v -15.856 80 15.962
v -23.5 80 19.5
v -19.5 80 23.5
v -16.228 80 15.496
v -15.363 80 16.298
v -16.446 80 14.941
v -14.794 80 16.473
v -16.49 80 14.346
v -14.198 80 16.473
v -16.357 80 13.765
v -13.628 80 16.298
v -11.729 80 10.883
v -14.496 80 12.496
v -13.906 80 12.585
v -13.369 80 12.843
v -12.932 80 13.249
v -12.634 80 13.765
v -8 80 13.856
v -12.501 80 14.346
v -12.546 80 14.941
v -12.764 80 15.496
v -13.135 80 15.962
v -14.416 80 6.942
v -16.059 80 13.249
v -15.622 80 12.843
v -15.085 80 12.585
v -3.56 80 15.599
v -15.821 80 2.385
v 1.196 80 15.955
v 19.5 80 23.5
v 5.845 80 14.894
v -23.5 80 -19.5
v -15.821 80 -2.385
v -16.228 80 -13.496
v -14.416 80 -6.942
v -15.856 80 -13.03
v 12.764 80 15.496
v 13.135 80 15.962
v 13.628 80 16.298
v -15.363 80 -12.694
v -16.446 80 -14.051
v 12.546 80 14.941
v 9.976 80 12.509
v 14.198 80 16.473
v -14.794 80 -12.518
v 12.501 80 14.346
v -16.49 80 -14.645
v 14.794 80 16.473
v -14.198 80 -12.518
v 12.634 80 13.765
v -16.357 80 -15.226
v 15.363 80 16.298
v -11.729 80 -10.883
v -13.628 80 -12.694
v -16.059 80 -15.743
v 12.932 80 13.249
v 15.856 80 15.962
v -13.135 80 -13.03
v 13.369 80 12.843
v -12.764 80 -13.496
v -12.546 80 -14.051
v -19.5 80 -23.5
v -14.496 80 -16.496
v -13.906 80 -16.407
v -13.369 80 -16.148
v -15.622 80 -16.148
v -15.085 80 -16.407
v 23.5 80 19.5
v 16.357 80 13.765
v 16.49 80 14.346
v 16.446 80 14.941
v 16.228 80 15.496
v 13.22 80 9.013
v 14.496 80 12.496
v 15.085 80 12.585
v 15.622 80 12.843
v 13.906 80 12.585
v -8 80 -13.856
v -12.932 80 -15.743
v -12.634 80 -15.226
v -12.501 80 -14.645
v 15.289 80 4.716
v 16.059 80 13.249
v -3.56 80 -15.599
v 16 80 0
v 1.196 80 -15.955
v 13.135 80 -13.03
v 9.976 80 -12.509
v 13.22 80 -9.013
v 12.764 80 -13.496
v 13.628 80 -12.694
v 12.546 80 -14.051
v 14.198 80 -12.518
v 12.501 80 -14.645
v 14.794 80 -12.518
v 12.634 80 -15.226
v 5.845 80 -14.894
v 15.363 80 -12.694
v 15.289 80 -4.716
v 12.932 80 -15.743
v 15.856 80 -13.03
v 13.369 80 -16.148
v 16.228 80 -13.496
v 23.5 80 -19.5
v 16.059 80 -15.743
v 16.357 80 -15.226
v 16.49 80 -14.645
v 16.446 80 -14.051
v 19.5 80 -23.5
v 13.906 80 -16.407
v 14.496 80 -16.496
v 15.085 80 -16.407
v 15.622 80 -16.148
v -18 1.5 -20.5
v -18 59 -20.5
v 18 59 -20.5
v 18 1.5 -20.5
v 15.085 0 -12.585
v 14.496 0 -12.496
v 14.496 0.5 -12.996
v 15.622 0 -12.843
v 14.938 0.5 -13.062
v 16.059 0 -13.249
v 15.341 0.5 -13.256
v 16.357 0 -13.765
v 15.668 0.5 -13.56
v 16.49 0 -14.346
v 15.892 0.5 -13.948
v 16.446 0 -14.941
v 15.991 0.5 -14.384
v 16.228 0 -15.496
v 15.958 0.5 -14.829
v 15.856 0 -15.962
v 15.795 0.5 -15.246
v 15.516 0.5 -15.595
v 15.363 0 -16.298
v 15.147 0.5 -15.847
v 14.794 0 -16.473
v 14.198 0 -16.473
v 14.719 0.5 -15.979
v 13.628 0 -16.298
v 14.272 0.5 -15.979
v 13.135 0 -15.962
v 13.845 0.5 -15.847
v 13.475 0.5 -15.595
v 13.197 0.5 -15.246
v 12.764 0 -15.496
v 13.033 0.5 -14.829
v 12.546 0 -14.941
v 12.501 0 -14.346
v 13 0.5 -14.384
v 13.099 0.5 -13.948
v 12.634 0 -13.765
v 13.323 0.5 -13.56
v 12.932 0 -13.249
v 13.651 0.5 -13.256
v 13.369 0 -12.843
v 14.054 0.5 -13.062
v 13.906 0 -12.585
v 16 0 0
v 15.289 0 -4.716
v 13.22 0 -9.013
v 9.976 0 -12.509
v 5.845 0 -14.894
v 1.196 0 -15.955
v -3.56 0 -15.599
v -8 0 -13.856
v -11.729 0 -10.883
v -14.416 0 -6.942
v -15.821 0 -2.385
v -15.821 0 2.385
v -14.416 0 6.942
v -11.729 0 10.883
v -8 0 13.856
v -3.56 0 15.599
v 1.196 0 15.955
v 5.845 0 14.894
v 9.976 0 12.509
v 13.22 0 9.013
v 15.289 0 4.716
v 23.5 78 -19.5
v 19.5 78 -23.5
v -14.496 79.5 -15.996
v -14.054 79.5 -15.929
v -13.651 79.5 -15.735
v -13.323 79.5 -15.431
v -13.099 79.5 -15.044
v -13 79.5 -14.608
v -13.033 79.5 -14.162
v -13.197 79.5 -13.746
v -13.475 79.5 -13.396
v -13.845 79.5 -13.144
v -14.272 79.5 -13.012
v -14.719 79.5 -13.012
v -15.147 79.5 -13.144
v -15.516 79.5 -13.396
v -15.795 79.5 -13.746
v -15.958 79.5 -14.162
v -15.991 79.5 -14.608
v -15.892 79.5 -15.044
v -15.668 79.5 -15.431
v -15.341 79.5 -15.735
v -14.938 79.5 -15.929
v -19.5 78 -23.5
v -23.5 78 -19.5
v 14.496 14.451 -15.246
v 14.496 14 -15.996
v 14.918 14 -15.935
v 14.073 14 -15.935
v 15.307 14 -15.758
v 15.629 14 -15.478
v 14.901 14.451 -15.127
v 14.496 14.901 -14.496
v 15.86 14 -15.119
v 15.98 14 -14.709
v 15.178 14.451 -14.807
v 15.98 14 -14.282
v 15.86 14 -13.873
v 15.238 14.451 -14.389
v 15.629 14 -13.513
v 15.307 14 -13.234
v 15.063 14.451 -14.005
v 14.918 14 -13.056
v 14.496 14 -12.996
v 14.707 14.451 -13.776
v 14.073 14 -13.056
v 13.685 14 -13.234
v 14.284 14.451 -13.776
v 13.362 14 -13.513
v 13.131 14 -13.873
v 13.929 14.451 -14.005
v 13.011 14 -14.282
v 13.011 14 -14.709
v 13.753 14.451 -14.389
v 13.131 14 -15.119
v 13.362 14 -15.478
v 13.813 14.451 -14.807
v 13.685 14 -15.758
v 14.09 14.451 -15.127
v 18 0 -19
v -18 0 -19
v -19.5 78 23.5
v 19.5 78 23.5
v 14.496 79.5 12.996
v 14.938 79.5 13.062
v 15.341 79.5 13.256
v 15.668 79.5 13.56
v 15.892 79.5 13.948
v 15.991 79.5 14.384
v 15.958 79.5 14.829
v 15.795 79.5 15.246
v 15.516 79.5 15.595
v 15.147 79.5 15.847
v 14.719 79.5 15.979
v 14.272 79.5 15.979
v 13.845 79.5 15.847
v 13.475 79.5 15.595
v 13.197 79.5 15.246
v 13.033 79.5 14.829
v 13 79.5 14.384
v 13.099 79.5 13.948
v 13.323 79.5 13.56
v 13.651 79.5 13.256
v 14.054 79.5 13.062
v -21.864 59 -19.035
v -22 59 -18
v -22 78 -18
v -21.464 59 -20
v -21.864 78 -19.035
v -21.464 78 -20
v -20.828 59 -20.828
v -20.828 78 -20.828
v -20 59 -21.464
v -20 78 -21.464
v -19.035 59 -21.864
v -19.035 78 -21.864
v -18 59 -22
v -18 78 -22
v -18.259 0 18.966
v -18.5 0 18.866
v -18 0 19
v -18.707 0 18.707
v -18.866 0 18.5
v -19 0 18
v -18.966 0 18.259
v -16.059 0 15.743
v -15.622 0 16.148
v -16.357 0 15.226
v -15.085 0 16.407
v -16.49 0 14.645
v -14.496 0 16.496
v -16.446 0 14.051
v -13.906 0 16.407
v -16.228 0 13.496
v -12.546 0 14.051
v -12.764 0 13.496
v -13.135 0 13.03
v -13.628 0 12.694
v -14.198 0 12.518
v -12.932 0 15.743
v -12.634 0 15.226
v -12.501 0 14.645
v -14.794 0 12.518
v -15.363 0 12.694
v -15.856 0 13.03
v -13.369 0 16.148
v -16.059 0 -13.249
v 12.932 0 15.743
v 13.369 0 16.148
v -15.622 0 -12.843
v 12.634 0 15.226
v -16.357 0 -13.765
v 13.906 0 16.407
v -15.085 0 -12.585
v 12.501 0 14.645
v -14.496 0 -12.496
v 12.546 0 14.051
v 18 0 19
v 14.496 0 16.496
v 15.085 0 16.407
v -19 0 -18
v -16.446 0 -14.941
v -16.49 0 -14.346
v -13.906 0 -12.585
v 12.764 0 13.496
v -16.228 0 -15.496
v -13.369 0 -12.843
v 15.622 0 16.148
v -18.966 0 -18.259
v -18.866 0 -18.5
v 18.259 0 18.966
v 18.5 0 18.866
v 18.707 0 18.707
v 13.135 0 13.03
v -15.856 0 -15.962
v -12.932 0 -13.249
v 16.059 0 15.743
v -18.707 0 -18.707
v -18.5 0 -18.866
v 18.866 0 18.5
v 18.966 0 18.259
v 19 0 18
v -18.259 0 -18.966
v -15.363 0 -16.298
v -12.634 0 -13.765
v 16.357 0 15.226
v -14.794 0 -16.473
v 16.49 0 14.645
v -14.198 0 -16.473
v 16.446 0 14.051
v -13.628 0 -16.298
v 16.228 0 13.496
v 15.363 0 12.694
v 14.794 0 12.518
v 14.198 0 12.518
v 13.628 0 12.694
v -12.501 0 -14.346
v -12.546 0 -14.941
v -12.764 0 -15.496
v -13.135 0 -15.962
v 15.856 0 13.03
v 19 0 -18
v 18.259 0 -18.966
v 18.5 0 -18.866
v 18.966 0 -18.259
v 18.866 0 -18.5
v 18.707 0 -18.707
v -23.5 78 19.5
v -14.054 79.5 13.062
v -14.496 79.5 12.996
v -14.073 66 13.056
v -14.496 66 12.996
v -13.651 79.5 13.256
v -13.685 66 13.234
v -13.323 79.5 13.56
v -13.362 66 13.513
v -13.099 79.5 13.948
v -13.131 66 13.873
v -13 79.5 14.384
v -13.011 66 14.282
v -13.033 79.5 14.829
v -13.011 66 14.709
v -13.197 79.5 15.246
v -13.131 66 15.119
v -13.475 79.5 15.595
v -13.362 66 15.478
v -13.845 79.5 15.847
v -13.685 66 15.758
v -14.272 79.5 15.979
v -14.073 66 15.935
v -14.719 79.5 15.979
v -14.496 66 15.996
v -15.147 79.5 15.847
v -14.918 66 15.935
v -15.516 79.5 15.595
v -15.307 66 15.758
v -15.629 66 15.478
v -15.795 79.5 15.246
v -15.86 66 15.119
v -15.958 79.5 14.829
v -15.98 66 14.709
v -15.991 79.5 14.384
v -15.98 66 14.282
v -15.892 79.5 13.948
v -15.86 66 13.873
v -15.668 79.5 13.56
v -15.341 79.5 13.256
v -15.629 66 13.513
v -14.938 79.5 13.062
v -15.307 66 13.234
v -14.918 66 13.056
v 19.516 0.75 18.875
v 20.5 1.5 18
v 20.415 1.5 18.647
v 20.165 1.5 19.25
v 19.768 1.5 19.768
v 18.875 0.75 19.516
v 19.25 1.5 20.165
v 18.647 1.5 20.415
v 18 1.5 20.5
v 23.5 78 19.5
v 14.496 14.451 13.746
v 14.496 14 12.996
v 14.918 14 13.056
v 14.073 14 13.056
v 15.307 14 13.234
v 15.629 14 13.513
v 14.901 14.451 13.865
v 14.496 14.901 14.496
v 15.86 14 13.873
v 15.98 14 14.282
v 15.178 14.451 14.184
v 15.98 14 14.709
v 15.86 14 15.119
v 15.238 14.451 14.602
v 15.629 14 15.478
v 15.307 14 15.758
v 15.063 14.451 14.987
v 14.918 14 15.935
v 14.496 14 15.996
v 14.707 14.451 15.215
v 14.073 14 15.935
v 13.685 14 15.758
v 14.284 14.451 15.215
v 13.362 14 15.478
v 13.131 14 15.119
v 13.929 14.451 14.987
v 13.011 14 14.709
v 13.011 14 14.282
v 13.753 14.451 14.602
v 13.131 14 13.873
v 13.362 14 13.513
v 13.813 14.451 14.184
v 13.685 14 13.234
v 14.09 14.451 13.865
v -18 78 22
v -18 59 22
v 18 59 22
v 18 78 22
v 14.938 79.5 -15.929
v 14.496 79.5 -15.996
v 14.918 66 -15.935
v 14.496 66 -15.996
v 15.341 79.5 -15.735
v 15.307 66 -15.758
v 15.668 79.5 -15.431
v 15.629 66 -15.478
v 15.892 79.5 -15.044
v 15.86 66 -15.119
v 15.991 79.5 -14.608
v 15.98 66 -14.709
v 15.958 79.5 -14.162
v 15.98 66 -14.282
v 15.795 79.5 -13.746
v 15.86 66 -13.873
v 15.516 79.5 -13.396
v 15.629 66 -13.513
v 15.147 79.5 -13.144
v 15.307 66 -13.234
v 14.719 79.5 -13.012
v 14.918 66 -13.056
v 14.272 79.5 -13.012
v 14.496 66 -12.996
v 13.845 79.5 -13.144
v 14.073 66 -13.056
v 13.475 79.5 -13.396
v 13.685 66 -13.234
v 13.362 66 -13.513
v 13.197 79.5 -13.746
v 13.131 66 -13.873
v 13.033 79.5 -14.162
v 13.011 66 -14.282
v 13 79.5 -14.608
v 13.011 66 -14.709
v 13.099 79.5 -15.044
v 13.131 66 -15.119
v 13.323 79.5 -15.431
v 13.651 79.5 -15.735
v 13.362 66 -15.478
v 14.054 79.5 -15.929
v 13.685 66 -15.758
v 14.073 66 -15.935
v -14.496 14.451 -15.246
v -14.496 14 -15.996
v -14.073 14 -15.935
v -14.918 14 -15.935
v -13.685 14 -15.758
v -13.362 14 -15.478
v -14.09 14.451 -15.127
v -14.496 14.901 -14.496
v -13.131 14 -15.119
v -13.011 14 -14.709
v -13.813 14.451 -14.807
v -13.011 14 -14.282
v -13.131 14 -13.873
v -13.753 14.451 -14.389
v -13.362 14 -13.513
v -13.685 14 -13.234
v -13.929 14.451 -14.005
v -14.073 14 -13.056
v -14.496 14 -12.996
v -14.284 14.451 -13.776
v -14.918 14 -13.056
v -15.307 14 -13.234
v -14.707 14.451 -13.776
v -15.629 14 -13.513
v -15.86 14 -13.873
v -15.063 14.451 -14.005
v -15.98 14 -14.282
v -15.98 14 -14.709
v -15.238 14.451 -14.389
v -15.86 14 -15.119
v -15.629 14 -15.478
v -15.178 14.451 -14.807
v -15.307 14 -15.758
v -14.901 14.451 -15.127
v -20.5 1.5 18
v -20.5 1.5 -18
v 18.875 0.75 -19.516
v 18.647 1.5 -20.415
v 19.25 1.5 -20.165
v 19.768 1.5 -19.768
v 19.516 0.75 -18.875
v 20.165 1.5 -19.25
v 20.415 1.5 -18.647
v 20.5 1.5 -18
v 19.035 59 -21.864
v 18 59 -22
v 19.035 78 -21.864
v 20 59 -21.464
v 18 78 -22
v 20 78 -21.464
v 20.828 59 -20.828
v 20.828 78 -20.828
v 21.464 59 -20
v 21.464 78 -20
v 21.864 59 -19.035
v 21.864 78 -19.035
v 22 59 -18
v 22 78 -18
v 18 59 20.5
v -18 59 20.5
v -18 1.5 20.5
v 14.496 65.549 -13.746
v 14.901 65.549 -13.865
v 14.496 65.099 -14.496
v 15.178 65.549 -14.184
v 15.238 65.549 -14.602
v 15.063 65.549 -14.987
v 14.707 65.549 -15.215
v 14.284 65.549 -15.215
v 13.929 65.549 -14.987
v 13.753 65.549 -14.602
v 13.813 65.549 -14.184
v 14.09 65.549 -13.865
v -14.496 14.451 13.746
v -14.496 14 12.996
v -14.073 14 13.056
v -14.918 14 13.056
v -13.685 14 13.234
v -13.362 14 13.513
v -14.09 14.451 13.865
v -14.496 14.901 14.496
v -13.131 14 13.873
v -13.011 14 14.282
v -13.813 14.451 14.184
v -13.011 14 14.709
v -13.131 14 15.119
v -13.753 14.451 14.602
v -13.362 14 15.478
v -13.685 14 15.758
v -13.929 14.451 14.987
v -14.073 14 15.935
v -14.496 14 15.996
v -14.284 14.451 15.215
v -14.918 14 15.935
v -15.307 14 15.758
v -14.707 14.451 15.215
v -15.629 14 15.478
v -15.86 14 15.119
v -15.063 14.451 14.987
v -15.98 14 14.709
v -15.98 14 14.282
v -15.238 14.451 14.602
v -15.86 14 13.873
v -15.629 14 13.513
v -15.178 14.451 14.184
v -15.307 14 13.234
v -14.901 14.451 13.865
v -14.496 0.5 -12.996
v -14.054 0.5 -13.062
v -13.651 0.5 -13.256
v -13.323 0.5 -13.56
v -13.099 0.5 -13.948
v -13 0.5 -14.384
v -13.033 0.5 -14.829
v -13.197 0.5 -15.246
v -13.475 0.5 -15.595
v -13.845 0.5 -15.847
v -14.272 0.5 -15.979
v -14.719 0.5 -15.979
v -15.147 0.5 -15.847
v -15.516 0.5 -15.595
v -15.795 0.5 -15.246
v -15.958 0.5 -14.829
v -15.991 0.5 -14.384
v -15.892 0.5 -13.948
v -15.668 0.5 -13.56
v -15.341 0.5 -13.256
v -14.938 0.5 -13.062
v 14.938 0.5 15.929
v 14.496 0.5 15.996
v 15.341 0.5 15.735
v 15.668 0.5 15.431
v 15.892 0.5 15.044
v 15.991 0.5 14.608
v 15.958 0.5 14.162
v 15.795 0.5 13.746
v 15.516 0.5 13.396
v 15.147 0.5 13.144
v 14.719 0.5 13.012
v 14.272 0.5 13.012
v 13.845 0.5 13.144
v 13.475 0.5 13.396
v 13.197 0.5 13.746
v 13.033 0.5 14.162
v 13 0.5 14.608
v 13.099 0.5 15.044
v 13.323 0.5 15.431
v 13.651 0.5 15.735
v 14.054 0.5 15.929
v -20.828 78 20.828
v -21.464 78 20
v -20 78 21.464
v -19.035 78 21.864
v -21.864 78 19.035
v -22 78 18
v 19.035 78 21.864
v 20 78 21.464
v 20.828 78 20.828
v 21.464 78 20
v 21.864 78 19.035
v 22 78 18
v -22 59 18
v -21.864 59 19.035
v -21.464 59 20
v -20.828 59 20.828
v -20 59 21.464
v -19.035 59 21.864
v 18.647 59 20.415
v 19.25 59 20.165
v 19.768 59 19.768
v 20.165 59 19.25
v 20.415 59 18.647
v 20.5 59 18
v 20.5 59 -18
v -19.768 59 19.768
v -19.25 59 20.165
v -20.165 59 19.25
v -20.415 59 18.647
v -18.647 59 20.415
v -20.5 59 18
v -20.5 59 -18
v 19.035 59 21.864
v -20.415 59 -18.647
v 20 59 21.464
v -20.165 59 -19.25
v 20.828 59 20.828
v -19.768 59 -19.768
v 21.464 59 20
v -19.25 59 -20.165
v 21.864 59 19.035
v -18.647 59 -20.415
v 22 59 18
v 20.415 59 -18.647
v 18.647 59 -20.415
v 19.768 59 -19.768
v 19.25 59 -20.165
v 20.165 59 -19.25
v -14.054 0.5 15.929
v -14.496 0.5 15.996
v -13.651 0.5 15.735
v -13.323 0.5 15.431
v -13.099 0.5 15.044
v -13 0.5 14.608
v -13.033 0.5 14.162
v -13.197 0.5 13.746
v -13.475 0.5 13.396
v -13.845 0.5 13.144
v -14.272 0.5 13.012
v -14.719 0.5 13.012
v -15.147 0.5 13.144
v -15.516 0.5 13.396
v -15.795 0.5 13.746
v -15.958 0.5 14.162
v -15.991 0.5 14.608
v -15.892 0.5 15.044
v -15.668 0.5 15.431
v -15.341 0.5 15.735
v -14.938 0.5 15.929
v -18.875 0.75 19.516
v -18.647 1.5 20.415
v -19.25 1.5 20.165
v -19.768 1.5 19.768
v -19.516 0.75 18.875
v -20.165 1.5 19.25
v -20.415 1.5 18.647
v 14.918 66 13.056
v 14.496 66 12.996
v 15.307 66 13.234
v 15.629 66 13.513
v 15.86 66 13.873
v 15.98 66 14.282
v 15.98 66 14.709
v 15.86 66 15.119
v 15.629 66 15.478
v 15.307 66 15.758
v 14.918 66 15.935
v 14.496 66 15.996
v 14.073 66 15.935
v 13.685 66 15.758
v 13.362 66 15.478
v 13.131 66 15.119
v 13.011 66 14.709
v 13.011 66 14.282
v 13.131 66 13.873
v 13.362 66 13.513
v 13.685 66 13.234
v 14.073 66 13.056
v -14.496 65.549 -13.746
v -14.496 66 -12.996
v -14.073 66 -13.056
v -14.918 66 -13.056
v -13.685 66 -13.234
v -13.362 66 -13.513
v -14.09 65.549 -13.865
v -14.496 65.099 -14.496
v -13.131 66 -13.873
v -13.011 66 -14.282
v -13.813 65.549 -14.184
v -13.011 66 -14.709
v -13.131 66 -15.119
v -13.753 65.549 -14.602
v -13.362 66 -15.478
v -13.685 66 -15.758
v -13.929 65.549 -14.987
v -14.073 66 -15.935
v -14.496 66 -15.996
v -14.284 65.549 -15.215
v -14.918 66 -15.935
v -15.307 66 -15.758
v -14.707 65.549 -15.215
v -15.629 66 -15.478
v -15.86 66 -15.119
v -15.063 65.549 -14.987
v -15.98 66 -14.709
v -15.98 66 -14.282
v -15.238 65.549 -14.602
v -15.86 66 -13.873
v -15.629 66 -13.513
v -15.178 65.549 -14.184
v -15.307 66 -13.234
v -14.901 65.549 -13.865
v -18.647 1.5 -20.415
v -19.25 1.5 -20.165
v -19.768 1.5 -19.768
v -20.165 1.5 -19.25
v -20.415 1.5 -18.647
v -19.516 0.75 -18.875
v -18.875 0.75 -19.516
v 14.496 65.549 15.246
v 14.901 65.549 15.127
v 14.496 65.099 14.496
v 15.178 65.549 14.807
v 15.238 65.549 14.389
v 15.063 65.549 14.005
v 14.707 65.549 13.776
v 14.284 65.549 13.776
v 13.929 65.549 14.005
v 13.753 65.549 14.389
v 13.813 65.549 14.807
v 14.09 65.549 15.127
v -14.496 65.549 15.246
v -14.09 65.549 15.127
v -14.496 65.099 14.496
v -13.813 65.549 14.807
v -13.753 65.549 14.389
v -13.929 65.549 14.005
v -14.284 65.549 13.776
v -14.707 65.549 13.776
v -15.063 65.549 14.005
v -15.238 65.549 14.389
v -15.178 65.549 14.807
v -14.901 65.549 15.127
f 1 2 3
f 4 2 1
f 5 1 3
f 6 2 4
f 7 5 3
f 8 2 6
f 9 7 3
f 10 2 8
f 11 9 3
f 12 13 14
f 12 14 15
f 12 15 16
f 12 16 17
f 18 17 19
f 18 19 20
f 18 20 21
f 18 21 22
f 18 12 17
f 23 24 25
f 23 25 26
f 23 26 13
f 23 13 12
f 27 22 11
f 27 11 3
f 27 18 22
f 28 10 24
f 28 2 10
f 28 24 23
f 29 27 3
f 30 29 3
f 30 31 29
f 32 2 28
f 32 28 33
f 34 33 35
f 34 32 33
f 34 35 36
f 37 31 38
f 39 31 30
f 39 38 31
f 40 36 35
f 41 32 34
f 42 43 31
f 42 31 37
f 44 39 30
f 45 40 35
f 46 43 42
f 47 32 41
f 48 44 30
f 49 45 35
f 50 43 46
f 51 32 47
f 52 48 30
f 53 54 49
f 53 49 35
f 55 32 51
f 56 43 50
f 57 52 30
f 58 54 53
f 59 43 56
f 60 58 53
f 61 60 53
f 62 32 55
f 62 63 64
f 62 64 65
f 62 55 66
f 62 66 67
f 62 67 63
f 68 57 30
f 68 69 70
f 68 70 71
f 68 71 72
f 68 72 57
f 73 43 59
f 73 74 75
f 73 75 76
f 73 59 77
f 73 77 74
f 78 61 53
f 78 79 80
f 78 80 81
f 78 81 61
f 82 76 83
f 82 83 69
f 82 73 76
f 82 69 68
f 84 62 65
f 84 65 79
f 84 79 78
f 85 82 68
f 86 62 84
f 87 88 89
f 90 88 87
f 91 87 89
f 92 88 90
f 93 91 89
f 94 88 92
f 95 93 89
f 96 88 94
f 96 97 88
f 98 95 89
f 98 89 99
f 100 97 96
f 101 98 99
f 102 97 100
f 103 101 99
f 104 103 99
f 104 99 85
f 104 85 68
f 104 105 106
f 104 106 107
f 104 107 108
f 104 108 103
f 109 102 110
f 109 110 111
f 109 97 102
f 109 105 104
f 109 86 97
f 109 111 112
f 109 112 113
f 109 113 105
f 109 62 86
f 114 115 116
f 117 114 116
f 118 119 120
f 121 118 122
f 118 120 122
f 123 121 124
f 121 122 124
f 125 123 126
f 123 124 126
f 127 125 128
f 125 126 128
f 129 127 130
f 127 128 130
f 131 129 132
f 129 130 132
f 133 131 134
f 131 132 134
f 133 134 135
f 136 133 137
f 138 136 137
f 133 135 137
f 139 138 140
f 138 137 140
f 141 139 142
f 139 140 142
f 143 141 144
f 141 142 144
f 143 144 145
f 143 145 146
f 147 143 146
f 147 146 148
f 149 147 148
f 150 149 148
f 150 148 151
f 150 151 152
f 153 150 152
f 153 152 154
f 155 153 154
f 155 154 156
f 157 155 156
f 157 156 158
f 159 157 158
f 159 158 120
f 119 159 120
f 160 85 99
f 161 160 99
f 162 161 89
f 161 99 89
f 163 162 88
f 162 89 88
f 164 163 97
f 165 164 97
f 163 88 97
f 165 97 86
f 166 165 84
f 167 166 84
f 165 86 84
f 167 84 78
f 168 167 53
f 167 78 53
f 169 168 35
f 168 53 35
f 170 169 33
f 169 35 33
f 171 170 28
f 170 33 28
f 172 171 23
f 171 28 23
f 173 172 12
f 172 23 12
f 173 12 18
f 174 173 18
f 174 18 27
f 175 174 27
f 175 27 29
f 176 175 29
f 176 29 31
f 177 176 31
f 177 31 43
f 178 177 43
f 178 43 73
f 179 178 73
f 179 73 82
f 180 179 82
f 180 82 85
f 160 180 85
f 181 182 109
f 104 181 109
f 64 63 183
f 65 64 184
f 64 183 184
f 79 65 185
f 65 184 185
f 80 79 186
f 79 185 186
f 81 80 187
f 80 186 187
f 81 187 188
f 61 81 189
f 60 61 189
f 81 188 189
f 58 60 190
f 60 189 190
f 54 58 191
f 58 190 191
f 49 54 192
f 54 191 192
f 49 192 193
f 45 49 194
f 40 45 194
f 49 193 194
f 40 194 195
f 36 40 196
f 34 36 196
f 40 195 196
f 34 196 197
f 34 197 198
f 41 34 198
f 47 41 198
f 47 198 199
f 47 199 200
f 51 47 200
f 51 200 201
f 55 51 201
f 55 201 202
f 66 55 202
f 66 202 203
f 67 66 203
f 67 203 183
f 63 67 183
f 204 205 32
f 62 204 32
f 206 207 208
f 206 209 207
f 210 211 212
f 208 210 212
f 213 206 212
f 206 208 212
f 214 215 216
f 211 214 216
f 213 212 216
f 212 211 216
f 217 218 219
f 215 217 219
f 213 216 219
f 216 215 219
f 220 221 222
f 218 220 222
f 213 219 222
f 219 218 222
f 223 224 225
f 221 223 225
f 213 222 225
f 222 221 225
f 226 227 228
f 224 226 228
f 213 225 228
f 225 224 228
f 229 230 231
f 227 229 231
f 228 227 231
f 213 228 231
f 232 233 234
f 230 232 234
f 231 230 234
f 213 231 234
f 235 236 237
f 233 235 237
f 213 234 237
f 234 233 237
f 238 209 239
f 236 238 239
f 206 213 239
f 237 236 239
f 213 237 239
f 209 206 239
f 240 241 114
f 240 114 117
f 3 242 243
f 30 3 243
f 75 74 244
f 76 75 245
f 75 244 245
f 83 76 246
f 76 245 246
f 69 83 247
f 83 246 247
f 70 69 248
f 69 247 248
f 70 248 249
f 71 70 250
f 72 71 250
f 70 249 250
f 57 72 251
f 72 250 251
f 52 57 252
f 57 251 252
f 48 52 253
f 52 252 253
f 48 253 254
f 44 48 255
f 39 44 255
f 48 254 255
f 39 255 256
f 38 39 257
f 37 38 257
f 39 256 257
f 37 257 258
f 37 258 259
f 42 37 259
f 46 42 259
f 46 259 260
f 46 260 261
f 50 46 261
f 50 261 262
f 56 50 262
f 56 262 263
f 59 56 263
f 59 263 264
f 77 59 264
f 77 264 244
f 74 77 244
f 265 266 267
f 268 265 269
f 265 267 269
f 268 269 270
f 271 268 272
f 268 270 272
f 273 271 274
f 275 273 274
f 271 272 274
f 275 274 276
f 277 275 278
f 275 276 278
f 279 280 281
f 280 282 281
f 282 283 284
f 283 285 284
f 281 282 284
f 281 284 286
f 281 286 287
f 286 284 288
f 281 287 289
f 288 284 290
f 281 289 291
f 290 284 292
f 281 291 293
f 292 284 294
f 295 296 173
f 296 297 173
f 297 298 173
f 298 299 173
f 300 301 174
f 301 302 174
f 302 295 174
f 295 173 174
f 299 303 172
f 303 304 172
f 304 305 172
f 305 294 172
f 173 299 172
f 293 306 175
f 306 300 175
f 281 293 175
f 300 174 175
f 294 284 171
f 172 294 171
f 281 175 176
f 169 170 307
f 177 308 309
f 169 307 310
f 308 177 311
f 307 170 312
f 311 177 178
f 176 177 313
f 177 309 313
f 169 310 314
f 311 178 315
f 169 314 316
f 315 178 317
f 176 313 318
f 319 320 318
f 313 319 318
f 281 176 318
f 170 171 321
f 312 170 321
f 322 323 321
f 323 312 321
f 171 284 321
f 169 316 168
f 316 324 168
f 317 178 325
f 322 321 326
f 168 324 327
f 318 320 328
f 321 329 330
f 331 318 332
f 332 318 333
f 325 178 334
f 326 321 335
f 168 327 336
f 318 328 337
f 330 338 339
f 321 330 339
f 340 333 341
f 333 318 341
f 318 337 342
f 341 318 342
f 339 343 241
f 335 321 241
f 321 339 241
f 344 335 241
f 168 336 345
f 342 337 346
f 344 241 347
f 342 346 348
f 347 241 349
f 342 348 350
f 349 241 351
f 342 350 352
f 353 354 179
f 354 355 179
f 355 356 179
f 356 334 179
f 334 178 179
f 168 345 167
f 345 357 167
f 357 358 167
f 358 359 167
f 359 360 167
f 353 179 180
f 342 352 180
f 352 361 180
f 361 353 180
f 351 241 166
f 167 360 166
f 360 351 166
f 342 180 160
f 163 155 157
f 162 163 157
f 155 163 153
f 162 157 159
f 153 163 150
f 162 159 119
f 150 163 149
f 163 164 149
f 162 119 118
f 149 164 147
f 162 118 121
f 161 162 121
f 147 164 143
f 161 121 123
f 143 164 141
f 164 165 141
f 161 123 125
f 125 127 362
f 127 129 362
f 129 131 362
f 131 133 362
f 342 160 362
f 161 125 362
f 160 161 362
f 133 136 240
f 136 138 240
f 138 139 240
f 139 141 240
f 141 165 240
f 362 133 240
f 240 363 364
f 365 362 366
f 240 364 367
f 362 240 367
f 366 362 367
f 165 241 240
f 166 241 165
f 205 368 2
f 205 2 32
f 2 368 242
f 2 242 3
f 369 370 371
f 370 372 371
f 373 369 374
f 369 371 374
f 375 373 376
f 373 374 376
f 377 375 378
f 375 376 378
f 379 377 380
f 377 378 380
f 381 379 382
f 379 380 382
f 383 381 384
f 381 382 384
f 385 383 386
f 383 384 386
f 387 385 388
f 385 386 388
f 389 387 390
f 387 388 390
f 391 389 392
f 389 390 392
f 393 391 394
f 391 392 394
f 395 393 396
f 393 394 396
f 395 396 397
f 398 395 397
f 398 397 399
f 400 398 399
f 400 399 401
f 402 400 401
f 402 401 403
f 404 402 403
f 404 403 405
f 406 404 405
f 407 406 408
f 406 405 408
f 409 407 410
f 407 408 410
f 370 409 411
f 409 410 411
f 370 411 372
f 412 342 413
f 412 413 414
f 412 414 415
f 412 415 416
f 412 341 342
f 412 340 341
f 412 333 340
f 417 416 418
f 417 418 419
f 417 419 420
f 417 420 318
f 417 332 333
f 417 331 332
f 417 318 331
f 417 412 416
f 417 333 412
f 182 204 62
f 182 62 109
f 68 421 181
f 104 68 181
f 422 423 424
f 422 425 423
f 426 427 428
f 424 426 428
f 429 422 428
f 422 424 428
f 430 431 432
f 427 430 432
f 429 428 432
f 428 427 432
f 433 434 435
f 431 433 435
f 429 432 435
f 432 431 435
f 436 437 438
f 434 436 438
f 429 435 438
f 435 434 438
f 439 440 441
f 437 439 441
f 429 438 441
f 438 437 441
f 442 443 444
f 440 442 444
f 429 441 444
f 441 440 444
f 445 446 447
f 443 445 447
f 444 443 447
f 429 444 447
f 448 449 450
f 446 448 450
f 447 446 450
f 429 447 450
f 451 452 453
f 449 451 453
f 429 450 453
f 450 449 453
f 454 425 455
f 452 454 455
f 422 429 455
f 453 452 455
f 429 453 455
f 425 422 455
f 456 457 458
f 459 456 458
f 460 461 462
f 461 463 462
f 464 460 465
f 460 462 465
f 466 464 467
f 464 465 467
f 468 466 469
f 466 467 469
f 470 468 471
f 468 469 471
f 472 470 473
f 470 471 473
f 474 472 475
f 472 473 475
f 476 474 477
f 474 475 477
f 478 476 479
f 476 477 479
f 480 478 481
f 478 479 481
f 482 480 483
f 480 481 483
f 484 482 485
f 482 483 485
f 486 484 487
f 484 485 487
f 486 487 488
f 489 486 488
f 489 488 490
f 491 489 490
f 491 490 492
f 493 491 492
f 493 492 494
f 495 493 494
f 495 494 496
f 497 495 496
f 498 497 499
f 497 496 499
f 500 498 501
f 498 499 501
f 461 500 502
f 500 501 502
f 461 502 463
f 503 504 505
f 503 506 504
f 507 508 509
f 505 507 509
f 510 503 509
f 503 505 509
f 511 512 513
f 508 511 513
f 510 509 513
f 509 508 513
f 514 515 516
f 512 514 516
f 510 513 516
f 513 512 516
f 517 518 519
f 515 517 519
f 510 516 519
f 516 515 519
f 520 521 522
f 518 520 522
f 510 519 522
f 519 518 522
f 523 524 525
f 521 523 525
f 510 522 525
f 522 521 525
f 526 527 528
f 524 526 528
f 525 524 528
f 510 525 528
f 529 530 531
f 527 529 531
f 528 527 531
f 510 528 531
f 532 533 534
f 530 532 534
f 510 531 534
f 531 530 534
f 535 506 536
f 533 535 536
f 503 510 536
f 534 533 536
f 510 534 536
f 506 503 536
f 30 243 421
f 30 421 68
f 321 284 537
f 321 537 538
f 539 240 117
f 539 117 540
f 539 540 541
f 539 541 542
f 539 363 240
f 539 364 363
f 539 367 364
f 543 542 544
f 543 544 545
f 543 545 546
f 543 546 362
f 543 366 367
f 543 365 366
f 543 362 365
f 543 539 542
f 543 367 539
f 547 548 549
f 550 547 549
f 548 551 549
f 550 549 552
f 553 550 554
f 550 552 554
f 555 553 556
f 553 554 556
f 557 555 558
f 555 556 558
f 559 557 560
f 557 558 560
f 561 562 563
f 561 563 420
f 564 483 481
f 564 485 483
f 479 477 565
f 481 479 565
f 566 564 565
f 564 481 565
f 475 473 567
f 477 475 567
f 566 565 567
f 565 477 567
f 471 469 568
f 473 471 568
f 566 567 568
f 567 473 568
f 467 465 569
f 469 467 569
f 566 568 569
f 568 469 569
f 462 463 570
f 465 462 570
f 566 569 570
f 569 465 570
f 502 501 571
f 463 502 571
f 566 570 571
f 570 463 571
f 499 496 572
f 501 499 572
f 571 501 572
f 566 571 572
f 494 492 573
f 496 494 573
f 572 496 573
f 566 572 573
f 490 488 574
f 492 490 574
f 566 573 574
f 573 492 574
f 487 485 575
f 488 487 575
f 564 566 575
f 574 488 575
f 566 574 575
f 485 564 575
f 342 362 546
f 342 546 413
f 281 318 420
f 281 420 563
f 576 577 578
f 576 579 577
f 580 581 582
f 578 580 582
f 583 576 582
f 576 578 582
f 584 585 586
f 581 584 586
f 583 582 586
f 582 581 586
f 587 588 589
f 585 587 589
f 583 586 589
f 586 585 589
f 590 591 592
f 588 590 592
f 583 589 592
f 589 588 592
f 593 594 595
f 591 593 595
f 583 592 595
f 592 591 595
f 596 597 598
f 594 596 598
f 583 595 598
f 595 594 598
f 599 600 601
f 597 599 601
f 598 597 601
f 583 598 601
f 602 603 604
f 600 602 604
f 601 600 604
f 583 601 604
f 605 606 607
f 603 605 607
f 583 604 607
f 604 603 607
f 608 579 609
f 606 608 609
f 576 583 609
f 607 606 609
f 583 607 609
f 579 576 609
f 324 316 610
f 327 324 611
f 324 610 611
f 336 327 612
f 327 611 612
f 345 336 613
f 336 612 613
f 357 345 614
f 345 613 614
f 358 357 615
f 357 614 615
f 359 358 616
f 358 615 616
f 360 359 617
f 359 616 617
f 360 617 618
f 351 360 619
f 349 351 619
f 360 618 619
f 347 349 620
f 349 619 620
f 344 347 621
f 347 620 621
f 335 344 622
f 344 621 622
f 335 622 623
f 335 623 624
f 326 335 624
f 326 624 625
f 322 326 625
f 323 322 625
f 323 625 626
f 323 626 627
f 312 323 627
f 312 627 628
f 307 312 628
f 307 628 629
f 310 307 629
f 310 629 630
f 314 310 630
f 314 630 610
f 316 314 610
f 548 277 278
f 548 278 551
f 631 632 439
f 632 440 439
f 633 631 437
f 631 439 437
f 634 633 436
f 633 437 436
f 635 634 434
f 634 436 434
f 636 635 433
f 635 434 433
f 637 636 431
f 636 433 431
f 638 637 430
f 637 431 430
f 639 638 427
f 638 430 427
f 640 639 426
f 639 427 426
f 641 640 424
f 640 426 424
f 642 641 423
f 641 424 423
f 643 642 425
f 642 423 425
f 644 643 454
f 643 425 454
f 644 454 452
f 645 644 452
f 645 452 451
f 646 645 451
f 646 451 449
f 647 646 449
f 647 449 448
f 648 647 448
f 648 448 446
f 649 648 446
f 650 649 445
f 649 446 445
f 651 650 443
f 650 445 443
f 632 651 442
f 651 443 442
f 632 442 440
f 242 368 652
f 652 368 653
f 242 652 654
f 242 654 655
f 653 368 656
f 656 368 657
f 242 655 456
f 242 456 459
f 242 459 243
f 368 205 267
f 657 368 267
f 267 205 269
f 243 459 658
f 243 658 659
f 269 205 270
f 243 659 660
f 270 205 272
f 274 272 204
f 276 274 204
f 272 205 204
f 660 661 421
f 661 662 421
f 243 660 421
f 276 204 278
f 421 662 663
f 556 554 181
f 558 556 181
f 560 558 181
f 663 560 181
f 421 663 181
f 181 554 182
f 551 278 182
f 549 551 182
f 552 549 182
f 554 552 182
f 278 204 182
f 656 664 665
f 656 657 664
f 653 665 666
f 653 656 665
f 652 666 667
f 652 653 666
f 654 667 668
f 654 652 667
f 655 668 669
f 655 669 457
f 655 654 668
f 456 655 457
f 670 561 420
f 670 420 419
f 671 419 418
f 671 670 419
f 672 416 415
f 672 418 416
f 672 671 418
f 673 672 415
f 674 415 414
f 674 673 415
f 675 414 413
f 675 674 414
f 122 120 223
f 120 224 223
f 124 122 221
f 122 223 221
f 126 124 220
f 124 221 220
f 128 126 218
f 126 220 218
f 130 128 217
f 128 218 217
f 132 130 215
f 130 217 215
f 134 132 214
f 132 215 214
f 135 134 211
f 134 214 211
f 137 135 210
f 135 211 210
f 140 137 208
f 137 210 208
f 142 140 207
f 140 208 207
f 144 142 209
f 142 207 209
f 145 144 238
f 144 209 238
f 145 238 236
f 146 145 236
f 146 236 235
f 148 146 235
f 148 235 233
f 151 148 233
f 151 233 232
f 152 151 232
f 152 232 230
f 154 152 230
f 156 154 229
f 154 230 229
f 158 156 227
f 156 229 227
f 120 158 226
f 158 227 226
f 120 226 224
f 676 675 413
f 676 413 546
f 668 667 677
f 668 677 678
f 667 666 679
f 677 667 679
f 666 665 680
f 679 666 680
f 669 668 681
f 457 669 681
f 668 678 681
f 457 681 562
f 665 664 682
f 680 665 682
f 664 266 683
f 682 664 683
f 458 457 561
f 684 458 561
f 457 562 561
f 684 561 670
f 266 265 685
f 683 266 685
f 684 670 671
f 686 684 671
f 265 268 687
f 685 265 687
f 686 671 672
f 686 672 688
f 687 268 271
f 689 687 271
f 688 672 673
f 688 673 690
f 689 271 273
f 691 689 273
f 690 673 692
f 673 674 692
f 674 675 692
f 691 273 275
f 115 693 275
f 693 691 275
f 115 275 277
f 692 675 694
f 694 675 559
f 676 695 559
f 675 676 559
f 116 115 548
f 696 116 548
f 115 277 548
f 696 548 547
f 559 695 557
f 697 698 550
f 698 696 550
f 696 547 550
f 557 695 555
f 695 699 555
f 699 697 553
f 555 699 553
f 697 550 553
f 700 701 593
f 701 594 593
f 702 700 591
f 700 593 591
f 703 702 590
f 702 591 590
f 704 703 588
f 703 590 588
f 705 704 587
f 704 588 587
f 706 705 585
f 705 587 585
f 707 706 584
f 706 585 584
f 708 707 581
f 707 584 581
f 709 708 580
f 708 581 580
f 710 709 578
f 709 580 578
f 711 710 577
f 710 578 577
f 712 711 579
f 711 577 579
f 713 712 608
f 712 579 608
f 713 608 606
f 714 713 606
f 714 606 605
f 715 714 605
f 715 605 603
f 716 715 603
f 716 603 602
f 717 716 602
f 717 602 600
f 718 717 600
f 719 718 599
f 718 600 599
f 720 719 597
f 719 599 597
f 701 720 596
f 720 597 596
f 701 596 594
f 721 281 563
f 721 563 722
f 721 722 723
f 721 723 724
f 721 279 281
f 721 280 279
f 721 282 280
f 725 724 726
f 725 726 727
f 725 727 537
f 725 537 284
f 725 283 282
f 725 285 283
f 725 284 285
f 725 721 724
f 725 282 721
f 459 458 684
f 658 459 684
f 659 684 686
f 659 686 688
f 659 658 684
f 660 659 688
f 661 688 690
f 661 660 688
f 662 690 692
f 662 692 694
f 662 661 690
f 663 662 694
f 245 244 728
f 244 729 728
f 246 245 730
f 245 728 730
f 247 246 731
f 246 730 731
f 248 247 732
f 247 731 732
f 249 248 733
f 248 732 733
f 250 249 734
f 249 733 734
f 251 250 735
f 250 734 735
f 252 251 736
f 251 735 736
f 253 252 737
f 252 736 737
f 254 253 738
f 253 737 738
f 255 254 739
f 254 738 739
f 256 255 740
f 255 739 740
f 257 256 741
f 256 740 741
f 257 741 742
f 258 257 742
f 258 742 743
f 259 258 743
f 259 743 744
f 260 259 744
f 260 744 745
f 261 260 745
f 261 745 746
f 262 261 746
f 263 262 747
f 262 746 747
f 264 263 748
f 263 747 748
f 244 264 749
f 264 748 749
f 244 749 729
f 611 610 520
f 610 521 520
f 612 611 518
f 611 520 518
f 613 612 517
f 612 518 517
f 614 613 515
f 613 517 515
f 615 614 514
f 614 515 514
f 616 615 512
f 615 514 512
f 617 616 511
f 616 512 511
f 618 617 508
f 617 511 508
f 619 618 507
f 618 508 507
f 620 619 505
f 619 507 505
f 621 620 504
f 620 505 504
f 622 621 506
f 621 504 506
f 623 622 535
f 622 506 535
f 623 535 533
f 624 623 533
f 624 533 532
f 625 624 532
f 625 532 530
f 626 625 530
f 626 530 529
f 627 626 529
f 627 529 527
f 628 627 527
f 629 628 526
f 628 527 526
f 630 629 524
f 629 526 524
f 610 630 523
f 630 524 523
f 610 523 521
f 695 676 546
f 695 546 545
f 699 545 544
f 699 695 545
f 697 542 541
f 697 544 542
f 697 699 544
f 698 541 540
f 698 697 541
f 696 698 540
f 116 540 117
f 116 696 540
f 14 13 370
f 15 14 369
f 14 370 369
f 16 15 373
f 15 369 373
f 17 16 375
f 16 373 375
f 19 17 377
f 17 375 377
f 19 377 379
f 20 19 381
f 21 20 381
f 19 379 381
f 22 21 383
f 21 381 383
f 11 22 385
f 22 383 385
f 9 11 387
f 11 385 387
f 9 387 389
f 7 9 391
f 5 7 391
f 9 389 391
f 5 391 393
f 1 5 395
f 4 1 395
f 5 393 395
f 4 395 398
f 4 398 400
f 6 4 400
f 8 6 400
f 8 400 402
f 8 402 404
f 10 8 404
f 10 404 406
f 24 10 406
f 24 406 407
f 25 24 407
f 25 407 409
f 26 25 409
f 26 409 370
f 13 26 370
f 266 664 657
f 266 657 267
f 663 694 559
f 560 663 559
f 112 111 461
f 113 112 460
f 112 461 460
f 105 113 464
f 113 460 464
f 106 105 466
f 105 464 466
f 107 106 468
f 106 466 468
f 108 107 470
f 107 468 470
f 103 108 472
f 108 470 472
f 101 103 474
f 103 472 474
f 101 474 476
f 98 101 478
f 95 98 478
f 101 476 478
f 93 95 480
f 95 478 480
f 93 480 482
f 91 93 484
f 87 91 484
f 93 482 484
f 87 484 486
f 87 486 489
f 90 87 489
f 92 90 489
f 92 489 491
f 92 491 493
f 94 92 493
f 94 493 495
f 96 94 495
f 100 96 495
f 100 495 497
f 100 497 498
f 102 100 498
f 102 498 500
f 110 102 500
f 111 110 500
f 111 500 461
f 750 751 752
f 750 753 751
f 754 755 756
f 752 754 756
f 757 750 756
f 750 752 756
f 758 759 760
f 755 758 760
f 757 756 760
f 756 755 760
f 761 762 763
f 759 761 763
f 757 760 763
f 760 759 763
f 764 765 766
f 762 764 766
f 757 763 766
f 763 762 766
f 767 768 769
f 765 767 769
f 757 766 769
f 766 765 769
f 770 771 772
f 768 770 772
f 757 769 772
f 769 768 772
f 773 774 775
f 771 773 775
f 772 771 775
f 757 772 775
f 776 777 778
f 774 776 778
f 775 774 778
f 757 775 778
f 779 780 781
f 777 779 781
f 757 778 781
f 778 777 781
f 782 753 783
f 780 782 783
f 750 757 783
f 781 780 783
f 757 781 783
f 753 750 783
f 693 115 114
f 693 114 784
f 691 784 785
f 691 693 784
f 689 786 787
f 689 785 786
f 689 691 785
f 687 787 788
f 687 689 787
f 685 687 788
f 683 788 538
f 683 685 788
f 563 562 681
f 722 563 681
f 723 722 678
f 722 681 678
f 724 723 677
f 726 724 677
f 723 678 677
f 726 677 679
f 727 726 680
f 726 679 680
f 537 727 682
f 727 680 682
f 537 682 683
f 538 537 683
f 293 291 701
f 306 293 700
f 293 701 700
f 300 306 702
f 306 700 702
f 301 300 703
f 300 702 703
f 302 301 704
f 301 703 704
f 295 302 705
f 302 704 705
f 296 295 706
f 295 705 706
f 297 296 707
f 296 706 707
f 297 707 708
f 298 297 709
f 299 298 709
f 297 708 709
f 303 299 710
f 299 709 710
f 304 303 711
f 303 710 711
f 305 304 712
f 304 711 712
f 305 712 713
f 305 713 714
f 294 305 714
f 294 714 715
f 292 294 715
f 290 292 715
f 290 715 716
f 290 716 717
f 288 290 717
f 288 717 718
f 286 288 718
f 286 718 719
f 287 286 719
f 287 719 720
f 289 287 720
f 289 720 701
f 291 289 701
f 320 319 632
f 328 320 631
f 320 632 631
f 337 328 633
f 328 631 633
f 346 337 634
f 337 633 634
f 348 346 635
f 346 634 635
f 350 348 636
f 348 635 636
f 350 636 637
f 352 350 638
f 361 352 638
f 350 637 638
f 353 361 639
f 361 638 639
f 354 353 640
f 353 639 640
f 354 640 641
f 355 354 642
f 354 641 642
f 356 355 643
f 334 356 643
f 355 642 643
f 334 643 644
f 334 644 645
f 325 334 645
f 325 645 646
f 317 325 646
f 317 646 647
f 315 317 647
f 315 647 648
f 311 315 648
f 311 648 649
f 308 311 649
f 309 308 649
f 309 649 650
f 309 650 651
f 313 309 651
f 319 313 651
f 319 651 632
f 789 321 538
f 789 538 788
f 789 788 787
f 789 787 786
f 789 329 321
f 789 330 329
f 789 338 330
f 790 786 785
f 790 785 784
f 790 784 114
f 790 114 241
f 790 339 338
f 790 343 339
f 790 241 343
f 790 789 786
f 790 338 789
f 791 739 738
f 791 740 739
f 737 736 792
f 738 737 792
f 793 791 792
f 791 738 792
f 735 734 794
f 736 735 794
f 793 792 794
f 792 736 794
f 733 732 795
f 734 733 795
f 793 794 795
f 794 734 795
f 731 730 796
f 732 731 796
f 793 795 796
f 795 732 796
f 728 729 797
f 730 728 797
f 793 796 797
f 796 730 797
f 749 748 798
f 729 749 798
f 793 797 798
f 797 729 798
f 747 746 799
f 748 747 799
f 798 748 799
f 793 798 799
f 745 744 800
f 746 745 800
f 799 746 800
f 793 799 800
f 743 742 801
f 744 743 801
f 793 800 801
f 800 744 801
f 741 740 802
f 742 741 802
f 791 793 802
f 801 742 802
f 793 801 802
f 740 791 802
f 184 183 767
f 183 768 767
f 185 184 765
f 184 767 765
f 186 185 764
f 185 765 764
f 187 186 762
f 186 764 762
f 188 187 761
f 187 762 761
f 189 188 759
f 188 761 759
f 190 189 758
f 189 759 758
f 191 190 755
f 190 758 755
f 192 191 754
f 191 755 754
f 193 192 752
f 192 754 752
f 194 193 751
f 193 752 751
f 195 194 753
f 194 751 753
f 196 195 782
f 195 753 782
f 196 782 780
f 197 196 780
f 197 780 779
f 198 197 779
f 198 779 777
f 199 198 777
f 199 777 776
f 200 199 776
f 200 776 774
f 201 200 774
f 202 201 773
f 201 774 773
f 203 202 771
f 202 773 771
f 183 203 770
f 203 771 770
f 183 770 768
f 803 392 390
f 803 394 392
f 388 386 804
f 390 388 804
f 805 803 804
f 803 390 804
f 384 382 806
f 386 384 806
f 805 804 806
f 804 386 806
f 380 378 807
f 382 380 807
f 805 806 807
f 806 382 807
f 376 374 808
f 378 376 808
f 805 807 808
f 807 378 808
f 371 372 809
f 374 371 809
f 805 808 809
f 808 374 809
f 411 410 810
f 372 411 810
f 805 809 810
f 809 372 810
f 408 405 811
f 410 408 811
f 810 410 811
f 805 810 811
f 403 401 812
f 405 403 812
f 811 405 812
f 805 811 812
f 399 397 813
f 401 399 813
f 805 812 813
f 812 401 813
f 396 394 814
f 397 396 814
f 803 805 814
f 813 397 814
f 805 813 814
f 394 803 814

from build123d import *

# Parameters (mm, degrees)
SKETCH_1_W                    = 41
SKETCH_1_H                    = 41
EXTRUDE_1_DEPTH               = 59
SKETCH_2_W                    = 44
SKETCH_2_H                    = 44
EXTRUDE_2_DEPTH               = 19
SKETCH_3_W                    = 47
SKETCH_3_H                    = 47
EXTRUDE_3_DEPTH               = 2
FILLET_1_R                    = 2.5
FILLET_2_R                    = 4
CHAMFER_1_SIZE                = 1.5
CHAMFER_2_SIZE                = 4
SKETCH_4_R                    = 16
CUT_EXTRUDE_4_DEPTH           = 81
M4X0_71_D                     = 3
M4X0_71_DEPTH                 = 14
M4X0_71_CSINK_D               = 4
M4X0_71_CSINK_ANGLE           = 90
M4X0_71_TIP                   = 0.901290929
M4X0_71_ON_FACE_2_D           = 3
M4X0_71_ON_FACE_2_DEPTH       = 14
M4X0_71_ON_FACE_2_CSINK_D     = 4
M4X0_71_ON_FACE_2_CSINK_ANGLE = 90
M4X0_71_ON_FACE_2_TIP         = 0.901290929


with BuildPart() as part:
    # Эскиз1 → Вытянуть1 (new body)
    with BuildSketch(Plane(origin=(0, 0, 0), x_dir=(1, 0, 0), z_dir=(0, 1, 0))):
        Rectangle(SKETCH_1_W, SKETCH_1_H)
    extrude(amount=EXTRUDE_1_DEPTH)

    # Эскиз2 → Вытянуть2 (add)
    with BuildSketch(Plane(origin=(0, 59, 0), x_dir=(1, 0, 0), z_dir=(0, 1, 0))):
        Rectangle(SKETCH_2_W, SKETCH_2_H)
    extrude(amount=EXTRUDE_2_DEPTH)

    # Эскиз3 → Вытянуть3 (add)
    with BuildSketch(Plane(origin=(0, 78, 0), x_dir=(1, 0, 0), z_dir=(0, 1, 0))):
        Rectangle(SKETCH_3_W, SKETCH_3_H)
    extrude(amount=EXTRUDE_3_DEPTH)

    # Скругление1
    fillet_1_edges = [part.edges().sort_by_distance(p)[0] for p in [
        (20.5, 29.5, 20.5),
        (-20.5, 29.5, 20.5),
        (-20.5, 29.5, -20.5),
        (20.5, 29.5, -20.5),
    ]]
    fillet(fillet_1_edges, radius=FILLET_1_R)

    # Скругление2
    fillet_2_edges = [part.edges().sort_by_distance(p)[0] for p in [
        (22, 68.5, 22),
        (22, 68.5, -22),
        (-22, 68.5, -22),
        (-22, 68.5, 22),
    ]]
    fillet(fillet_2_edges, radius=FILLET_2_R)

    # Фаска1
    chamfer_1_edges = [part.edges().sort_by_distance(p)[0] for p in [
        (-20.5, 0, 0),
        (20.5, 0, 0),
        (0, 0, 20.5),
        (0, 0, -20.5),
        (19.767766953, 0, 19.767766953),
        (19.767766953, 0, -19.767766953),
        (-19.767766953, 0, 19.767766953),
        (-19.767766953, 0, -19.767766953),
    ]]
    chamfer(chamfer_1_edges, length=CHAMFER_1_SIZE)

    # Фаска2
    chamfer_2_edges = [part.edges().sort_by_distance(p)[0] for p in [
        (23.5, 79, 23.5),
        (23.5, 79, -23.5),
        (-23.5, 79, -23.5),
        (-23.5, 79, 23.5),
    ]]
    chamfer(chamfer_2_edges, length=CHAMFER_2_SIZE)

    # Эскиз4 → Вытянуть4 (cut, through all)
    with BuildSketch(Plane(origin=(0, 80, 0), x_dir=(1, 0, 0), z_dir=(0, 1, 0))):
        Circle(SKETCH_4_R)
    extrude(amount=-CUT_EXTRUDE_4_DEPTH, mode=Mode.SUBTRACT)

    # Отверстие обработанное метчиком M4x0.71
    with Locations(Plane(origin=(-14.495689014, 0, 14.495689014), x_dir=(0, 0, -1), z_dir=(0, -1, 0))):
        with Locations((0, 0), (28.991378028, 0), (28.991378028, 28.991378028), (0, 28.991378028)):
            CounterSinkHole(M4X0_71_D / 2, M4X0_71_CSINK_D / 2, depth=M4X0_71_DEPTH, counter_sink_angle=M4X0_71_CSINK_ANGLE)
            with Locations((0, 0, -(M4X0_71_DEPTH + M4X0_71_TIP / 2))):  # 118° drill point
                Cone(0, M4X0_71_D / 2, M4X0_71_TIP, mode=Mode.SUBTRACT)

    # Отверстие обработанное метчиком M4x0.71 on face 2
    with Locations(Plane(origin=(-14.495689014, 80, 14.495689014), x_dir=(0, 0, 1), z_dir=(0, 1, 0))):
        with Locations((0, 0), (0, 28.991378028), (-28.991378028, 28.991378028), (-28.991378028, 0)):
            CounterSinkHole(M4X0_71_ON_FACE_2_D / 2, M4X0_71_ON_FACE_2_CSINK_D / 2, depth=M4X0_71_ON_FACE_2_DEPTH, counter_sink_angle=M4X0_71_ON_FACE_2_CSINK_ANGLE)
            with Locations((0, 0, -(M4X0_71_ON_FACE_2_DEPTH + M4X0_71_ON_FACE_2_TIP / 2))):  # 118° drill point
                Cone(0, M4X0_71_ON_FACE_2_D / 2, M4X0_71_ON_FACE_2_TIP, mode=Mode.SUBTRACT)


solid = part.part
